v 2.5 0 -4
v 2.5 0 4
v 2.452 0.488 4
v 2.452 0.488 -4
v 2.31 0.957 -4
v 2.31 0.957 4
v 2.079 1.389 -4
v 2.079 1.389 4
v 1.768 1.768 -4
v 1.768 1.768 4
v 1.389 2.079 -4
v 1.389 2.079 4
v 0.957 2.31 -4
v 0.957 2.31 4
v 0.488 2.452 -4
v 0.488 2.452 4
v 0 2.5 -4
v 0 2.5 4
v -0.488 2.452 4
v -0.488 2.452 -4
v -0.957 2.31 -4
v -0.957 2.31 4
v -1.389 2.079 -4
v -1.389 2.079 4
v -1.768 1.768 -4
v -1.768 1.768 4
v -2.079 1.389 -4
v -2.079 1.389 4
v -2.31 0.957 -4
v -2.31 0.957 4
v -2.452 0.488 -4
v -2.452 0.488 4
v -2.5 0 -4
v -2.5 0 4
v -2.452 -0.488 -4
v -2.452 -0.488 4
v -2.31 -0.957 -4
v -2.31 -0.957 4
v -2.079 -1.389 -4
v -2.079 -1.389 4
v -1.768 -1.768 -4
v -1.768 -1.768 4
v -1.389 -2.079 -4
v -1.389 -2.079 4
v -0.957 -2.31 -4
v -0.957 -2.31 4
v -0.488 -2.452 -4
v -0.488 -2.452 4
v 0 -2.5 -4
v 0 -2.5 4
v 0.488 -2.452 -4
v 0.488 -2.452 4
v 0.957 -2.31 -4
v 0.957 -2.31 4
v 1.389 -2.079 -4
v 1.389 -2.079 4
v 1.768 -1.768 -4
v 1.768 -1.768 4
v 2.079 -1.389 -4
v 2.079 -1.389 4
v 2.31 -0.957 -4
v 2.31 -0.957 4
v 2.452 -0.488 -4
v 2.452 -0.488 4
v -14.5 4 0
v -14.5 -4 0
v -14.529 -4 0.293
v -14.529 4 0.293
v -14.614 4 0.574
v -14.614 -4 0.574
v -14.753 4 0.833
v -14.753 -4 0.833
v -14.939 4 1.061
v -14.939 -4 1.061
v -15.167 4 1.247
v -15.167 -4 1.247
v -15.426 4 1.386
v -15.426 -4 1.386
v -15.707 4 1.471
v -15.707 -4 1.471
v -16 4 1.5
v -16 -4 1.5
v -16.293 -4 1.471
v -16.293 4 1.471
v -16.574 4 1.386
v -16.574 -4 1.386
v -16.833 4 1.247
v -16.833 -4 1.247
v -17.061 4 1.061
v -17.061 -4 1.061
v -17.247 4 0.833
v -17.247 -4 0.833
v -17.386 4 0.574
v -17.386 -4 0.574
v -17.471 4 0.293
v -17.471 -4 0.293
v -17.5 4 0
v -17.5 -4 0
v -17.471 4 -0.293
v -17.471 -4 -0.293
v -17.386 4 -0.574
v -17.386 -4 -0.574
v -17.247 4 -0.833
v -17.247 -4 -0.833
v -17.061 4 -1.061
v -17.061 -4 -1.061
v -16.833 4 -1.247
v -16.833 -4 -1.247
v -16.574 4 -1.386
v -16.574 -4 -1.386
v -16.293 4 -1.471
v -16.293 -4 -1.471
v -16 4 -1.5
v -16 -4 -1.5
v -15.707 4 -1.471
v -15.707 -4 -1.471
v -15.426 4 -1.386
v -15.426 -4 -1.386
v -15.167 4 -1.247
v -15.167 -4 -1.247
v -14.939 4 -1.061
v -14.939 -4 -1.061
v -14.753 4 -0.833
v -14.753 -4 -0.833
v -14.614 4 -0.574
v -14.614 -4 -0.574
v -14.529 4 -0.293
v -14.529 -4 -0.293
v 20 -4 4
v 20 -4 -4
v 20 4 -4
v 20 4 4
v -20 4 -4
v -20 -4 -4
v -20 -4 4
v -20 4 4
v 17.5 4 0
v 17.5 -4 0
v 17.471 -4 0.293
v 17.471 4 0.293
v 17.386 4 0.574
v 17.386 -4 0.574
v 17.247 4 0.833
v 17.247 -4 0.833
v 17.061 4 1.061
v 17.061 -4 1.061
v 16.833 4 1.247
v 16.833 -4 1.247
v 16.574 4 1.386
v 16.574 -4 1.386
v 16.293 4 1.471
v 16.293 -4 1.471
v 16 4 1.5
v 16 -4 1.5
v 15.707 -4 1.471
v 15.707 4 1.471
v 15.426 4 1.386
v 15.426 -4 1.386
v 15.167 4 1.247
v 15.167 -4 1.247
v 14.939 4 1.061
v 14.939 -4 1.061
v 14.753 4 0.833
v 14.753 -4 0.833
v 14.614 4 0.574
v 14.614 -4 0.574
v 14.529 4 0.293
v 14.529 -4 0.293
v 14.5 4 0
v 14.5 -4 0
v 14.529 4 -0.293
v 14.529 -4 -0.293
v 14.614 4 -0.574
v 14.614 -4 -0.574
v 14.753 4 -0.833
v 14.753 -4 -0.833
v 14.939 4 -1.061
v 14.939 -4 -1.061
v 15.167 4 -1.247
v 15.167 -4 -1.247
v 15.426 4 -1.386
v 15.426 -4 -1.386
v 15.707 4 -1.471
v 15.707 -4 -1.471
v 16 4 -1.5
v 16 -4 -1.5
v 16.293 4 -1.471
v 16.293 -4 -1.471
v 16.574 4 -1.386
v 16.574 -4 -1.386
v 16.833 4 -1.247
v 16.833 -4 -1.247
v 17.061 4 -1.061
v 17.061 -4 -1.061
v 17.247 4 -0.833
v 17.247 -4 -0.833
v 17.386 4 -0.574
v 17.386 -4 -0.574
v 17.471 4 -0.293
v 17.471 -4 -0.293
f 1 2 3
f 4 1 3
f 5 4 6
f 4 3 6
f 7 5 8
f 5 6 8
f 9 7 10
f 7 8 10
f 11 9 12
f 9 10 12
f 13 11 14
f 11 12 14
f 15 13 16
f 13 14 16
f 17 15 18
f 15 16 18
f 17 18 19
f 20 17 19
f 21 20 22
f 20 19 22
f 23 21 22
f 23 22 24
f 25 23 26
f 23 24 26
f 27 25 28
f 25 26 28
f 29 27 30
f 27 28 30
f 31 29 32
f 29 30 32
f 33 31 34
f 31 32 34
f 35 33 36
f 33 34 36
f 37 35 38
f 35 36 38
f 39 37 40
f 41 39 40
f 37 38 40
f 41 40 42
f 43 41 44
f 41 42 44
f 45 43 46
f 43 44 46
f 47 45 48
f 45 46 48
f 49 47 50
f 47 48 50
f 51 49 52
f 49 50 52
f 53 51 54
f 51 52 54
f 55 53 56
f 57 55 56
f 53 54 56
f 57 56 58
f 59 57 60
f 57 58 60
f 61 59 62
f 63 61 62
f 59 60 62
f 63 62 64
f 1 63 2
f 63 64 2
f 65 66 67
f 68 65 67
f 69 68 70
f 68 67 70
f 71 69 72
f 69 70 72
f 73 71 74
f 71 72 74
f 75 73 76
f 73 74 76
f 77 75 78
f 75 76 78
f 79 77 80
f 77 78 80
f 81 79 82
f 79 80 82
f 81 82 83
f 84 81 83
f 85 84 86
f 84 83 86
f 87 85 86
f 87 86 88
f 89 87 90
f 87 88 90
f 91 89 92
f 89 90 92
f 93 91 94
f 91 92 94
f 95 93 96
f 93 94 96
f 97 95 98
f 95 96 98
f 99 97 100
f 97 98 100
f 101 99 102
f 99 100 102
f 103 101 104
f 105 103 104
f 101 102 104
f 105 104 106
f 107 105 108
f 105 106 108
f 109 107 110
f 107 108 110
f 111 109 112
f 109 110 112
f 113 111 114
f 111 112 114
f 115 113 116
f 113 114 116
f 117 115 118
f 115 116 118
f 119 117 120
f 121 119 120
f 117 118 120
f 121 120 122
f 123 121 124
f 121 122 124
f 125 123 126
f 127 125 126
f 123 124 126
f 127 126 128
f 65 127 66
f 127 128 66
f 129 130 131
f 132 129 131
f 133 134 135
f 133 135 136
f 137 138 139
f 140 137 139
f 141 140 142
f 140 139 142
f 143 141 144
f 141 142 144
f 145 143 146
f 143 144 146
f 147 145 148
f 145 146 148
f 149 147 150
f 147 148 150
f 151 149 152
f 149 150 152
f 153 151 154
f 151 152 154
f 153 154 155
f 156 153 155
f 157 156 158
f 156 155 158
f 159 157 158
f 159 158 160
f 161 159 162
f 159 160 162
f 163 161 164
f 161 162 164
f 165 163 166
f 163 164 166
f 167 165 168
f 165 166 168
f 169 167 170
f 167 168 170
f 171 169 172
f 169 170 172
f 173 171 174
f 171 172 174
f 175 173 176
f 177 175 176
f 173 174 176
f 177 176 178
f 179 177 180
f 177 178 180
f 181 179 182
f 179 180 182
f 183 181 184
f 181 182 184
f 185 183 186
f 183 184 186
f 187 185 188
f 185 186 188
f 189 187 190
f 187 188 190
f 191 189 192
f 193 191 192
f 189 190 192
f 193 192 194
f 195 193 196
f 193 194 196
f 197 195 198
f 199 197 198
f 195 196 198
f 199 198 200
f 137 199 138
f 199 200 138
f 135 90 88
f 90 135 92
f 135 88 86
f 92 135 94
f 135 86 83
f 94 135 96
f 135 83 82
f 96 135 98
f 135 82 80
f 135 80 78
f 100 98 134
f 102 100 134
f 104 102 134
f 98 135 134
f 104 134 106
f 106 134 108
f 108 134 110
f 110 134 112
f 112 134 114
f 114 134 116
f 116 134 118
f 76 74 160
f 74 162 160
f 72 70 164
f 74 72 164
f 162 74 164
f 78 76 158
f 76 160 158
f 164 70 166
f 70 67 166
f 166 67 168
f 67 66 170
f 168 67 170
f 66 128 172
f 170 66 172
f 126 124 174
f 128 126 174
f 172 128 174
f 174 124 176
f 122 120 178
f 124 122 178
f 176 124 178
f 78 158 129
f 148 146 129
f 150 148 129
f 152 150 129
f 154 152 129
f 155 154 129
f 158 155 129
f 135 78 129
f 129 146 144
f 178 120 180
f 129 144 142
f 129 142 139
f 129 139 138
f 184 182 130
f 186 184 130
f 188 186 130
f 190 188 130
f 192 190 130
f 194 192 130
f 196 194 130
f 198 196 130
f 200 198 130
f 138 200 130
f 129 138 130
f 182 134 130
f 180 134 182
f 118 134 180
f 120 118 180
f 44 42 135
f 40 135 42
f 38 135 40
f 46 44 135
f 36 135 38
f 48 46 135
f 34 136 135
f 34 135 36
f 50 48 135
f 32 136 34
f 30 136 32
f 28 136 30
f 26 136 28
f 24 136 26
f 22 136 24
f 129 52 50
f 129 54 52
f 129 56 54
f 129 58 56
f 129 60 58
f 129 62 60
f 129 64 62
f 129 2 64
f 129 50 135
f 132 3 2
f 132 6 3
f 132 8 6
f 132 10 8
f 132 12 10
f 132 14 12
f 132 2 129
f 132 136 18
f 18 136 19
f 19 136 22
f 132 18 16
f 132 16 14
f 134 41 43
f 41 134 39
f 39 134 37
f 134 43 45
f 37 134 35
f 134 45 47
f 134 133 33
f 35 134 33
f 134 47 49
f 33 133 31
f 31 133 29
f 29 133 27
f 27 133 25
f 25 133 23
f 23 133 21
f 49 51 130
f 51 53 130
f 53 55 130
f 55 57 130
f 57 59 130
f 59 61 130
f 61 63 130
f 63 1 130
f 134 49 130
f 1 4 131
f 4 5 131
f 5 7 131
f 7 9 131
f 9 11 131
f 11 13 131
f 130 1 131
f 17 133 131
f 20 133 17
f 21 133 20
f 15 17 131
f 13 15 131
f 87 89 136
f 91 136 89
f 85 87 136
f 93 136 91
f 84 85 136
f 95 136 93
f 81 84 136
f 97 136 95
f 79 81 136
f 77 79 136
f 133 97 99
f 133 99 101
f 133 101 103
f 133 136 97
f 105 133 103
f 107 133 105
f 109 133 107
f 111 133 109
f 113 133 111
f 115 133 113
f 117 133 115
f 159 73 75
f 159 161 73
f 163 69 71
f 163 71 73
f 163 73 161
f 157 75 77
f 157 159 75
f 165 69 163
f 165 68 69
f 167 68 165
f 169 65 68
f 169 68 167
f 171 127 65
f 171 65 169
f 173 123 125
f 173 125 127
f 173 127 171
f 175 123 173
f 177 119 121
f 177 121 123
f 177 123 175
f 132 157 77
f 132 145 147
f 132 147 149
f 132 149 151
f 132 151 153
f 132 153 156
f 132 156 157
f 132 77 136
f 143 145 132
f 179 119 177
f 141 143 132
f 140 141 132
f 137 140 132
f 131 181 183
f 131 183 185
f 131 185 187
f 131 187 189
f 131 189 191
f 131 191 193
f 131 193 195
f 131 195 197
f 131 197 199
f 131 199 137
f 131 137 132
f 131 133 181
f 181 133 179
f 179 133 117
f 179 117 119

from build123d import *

# Parameters (mm, degrees)
BOX_W           = 40
BOX_H           = 8
BOX_DEPTH       = 8
SKETCH_R        = 2.5
POCKET_DEPTH    = 8
SKETCH001_R     = 1.5
POCKET001_DEPTH = 8


with BuildPart() as part:
    # Box → Box (new body)
    with BuildSketch(Plane(origin=(-20, -4, -4), x_dir=(1, 0, 0), z_dir=(0, 0, 1))):
        with Locations((20, 4)):
            Rectangle(BOX_W, BOX_H)
    extrude(amount=BOX_DEPTH)

    # Sketch → Pocket (cut)
    with BuildSketch(Plane(origin=(-20, -4, 4), x_dir=(1, 0, 0), z_dir=(0, 0, 1))):
        with Locations((20, 4)):
            Circle(SKETCH_R)
    extrude(amount=-POCKET_DEPTH, mode=Mode.SUBTRACT)

    # Sketch001 → Pocket001 (cut)
    with BuildSketch(Plane(origin=(-20, -4, -4), x_dir=(1, 0, 0), z_dir=(0, -1, 0))):
        with Locations((4, 4)):
            Circle(SKETCH001_R)
        with Locations((36, 4)):
            Circle(SKETCH001_R)
    extrude(amount=-POCKET001_DEPTH, mode=Mode.SUBTRACT)


solid = part.part
